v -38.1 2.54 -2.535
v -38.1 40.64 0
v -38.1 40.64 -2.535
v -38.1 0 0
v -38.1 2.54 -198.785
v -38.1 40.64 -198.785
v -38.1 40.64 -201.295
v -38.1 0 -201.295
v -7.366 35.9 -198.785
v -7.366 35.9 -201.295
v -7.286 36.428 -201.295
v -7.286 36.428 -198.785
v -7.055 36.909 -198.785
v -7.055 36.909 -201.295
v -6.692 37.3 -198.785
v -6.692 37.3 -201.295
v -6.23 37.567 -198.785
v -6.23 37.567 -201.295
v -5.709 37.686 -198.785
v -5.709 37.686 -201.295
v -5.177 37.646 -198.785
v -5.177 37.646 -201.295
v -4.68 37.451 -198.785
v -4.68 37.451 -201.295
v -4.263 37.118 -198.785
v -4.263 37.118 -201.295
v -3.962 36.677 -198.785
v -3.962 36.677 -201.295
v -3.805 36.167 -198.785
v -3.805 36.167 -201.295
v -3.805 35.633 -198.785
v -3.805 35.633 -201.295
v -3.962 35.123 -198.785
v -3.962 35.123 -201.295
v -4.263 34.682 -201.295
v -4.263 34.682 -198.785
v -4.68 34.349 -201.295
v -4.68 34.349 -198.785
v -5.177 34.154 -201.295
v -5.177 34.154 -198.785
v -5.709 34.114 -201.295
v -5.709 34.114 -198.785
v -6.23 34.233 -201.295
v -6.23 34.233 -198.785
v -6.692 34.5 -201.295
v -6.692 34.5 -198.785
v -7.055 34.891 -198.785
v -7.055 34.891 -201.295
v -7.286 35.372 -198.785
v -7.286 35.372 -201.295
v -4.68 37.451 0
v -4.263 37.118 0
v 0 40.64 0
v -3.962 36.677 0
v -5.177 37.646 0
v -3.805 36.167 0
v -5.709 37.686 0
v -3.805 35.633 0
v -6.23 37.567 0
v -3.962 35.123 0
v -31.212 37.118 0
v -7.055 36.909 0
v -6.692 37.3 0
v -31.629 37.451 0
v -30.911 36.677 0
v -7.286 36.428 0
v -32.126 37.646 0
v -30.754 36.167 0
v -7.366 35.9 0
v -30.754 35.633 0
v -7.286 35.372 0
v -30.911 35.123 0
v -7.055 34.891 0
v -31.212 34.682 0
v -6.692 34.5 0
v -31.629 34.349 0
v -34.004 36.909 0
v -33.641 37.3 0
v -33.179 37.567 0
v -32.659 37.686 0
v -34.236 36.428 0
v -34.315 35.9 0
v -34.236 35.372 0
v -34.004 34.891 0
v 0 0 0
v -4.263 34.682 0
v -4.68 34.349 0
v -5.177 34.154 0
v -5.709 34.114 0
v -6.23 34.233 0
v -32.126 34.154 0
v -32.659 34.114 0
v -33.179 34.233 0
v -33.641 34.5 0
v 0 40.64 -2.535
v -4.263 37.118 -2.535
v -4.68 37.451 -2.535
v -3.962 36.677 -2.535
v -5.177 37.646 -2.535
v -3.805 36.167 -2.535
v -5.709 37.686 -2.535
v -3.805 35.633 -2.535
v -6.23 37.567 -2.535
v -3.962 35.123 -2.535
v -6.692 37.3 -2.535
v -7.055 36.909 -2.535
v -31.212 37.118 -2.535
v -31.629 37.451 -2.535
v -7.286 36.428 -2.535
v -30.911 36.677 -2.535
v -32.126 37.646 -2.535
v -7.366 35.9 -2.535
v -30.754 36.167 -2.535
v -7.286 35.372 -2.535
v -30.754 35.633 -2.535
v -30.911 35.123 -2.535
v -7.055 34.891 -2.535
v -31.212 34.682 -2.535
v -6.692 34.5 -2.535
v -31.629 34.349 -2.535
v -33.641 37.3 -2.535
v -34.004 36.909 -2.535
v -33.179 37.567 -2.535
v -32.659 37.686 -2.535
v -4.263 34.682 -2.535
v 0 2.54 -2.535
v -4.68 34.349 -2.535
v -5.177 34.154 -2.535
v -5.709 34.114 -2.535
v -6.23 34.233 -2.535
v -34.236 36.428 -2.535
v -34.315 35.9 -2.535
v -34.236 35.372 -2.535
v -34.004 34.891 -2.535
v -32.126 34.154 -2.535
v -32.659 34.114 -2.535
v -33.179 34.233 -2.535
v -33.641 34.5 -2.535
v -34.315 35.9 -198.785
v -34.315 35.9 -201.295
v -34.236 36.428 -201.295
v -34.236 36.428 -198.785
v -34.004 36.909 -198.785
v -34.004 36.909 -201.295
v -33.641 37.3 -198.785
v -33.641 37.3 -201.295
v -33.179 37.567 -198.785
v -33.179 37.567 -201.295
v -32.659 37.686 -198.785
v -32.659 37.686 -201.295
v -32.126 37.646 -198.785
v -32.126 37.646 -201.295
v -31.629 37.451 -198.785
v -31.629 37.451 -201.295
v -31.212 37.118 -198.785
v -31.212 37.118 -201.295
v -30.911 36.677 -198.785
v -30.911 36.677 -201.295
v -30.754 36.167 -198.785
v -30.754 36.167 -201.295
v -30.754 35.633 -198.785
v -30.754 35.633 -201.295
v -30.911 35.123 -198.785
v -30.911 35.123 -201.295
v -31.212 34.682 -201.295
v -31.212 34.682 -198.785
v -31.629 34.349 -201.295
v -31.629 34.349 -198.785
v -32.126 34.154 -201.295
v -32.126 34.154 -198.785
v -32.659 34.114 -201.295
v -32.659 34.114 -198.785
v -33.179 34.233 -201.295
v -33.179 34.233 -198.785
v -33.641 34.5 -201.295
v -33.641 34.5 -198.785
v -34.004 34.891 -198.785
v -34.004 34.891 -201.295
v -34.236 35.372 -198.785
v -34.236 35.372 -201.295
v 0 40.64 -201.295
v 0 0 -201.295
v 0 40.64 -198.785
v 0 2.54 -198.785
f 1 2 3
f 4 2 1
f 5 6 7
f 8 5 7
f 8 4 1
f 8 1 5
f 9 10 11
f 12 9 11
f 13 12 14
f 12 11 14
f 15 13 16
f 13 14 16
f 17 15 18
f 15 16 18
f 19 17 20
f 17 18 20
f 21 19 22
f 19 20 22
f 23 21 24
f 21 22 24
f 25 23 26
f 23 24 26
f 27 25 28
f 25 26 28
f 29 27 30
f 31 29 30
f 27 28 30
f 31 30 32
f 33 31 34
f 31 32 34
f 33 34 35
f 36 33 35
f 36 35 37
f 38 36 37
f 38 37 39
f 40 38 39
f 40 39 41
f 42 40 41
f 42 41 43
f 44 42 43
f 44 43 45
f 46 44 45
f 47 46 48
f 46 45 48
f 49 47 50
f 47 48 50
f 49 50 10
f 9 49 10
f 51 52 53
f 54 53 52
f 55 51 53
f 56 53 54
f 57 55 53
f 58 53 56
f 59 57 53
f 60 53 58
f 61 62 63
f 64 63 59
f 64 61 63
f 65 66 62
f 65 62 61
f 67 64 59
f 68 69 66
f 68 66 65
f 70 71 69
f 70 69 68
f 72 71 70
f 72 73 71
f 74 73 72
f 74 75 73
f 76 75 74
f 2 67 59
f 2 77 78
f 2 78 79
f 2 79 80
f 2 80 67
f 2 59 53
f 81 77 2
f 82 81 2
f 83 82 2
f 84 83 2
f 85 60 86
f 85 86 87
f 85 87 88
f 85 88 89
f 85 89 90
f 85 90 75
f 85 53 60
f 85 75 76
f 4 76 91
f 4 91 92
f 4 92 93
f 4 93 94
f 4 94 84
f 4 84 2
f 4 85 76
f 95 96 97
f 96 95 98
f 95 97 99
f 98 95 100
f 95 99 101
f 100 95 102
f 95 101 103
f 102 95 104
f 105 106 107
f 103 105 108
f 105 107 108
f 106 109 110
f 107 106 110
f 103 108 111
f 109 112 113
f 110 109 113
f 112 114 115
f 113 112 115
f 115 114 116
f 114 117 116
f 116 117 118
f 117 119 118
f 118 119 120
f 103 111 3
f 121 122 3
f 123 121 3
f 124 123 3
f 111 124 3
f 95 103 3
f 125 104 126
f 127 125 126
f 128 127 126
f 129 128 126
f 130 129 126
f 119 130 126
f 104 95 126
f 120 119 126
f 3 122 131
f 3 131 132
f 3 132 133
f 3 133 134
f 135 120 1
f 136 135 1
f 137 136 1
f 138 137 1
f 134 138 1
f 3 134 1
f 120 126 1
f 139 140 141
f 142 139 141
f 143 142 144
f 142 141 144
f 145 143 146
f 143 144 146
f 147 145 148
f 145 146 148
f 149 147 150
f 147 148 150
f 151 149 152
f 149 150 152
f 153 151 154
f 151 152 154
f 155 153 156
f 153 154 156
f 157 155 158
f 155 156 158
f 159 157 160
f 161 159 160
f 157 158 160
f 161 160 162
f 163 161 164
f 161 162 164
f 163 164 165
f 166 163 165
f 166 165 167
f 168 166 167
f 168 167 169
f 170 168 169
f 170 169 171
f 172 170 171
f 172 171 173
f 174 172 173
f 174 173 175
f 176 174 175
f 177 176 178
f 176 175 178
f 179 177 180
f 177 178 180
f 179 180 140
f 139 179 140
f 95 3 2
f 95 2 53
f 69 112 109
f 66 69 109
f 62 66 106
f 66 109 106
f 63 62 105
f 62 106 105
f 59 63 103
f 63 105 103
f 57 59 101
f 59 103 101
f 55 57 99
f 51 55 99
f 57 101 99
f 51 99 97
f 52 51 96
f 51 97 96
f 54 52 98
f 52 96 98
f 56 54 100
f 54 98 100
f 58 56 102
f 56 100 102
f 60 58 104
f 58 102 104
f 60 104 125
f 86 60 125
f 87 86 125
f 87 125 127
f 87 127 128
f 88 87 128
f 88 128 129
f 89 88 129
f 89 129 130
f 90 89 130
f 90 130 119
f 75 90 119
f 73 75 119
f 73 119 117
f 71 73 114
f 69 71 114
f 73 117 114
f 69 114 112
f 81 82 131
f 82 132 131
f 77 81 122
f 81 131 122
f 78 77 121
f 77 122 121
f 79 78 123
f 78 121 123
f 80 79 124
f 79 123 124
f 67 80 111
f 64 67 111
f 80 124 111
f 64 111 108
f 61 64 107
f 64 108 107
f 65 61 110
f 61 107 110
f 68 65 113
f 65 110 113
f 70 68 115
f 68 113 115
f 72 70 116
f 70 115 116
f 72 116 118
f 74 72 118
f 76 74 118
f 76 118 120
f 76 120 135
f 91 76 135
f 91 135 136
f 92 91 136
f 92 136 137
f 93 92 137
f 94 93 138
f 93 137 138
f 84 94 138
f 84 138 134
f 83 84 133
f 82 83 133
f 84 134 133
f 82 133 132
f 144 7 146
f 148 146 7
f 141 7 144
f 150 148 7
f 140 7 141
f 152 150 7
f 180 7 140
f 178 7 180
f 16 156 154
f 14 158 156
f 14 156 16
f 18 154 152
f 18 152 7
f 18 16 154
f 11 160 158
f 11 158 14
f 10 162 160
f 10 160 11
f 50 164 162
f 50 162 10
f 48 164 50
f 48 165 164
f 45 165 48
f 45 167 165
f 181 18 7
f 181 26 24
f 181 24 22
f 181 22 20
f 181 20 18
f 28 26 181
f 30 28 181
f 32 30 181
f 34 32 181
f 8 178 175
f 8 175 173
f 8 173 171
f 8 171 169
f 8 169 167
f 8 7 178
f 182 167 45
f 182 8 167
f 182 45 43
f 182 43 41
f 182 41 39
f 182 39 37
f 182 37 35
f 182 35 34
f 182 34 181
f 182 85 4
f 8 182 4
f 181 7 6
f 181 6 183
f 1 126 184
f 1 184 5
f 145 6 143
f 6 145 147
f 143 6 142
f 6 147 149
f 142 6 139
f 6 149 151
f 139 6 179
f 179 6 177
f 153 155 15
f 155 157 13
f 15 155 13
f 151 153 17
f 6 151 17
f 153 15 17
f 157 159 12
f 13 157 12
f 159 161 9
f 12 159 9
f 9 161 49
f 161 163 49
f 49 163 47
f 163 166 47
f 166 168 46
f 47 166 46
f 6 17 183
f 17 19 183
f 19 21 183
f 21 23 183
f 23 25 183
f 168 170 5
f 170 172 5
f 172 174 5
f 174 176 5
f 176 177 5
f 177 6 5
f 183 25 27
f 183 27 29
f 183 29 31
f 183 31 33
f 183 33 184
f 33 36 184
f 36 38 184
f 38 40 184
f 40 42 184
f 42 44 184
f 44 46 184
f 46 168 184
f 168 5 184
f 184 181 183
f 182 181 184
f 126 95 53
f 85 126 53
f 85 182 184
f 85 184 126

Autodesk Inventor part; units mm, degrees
ref_plane "YZ Plane" through (0, 0, 0) normal (1, 0, 0) x (0, 1, 0)
ref_plane "XZ Plane" through (0, 0, 0) normal (0, 1, 0) x (-1, 0, 0)
ref_plane "XY Plane" through (0, 0, 0) normal (0, 0, 1) x (1, 0, 0)
sketch "Sketch1" plane through (0, 0, 0) normal (0, 1, 0) x (-1, 0, 0)
  line L0 (0, 0) -> (38.1, 0)
  line L1 (38.1, 0) -> (38.1, -201.295)
  line L2 (38.1, -201.295) -> (0, -201.295)
  line L3 (0, -201.295) -> (0, 0)
  dimension "d0" = 201.295
  dimension "d1" = 38.1
extrude "Extrusion1" add sketch "Sketch1" along normal blind 2.54
sketch "Sketch2" plane through (0, 2.54, 0) normal (0, 1, 0) x (1, 0, 0)
  line L0 (-38.1, 201.295) -> (-38.1, 0) projected
  line L1 (-38.1, 0) -> (0, 0) projected
  line L2 (0, 0) -> (0, 201.295) projected
  line L3 (-38.1, 0) -> (0, 0)
  line L4 (0, 0) -> (0, 2.535)
  line L5 (0, 2.535) -> (-38.1, 2.535)
  line L6 (-38.1, 2.535) -> (-38.1, 0)
  line L7 (0, 201.295) -> (-38.1, 201.295)
  line L8 (-38.1, 201.295) -> (-38.1, 198.7847)
  line L9 (-38.1, 198.7847) -> (0, 198.7847)
  line L10 (0, 198.7847) -> (0, 201.295)
extrude "Extrusion2" add sketch "Sketch2" along normal blind 38.1 contours L7 L2 L9 L0 | L5 L2 L1 L0
sketch "Sketch3" plane through (0, 0, -201.295) normal (0, 0, -1) x (-1, 0, 0)
  line L0 (38.1, 40.64) -> (0, 40.64) projected
  line L1 (19.05, 40.64) -> (19.05, 0)
  line L2 (38.1, 0) -> (0, 0) projected
  line L3 (0, 0) -> (0, 40.64) projected
  line L4 (0, 20.32) -> (38.1, 20.32)
  line L5 (38.1, 2.54) -> (38.1, 40.64) projected
  circle A0 centre (19.05, 35.9001) radius 13.4747
  circle A1 centre (32.5247, 35.9001) radius 1.7907
  circle A2 centre (5.5753, 35.9001) radius 1.7907
  dimension "d11" = 26.9494
  dimension "d12" = 3.5814
  dimension "d13" = 3.5814
extrude "Extrusion3" cut sketch "Sketch3" against normal blind 246.0625 contours A1 A0 | A0 A1 | A2 A0 | A0 A2
properties part number "LiftBrace"
